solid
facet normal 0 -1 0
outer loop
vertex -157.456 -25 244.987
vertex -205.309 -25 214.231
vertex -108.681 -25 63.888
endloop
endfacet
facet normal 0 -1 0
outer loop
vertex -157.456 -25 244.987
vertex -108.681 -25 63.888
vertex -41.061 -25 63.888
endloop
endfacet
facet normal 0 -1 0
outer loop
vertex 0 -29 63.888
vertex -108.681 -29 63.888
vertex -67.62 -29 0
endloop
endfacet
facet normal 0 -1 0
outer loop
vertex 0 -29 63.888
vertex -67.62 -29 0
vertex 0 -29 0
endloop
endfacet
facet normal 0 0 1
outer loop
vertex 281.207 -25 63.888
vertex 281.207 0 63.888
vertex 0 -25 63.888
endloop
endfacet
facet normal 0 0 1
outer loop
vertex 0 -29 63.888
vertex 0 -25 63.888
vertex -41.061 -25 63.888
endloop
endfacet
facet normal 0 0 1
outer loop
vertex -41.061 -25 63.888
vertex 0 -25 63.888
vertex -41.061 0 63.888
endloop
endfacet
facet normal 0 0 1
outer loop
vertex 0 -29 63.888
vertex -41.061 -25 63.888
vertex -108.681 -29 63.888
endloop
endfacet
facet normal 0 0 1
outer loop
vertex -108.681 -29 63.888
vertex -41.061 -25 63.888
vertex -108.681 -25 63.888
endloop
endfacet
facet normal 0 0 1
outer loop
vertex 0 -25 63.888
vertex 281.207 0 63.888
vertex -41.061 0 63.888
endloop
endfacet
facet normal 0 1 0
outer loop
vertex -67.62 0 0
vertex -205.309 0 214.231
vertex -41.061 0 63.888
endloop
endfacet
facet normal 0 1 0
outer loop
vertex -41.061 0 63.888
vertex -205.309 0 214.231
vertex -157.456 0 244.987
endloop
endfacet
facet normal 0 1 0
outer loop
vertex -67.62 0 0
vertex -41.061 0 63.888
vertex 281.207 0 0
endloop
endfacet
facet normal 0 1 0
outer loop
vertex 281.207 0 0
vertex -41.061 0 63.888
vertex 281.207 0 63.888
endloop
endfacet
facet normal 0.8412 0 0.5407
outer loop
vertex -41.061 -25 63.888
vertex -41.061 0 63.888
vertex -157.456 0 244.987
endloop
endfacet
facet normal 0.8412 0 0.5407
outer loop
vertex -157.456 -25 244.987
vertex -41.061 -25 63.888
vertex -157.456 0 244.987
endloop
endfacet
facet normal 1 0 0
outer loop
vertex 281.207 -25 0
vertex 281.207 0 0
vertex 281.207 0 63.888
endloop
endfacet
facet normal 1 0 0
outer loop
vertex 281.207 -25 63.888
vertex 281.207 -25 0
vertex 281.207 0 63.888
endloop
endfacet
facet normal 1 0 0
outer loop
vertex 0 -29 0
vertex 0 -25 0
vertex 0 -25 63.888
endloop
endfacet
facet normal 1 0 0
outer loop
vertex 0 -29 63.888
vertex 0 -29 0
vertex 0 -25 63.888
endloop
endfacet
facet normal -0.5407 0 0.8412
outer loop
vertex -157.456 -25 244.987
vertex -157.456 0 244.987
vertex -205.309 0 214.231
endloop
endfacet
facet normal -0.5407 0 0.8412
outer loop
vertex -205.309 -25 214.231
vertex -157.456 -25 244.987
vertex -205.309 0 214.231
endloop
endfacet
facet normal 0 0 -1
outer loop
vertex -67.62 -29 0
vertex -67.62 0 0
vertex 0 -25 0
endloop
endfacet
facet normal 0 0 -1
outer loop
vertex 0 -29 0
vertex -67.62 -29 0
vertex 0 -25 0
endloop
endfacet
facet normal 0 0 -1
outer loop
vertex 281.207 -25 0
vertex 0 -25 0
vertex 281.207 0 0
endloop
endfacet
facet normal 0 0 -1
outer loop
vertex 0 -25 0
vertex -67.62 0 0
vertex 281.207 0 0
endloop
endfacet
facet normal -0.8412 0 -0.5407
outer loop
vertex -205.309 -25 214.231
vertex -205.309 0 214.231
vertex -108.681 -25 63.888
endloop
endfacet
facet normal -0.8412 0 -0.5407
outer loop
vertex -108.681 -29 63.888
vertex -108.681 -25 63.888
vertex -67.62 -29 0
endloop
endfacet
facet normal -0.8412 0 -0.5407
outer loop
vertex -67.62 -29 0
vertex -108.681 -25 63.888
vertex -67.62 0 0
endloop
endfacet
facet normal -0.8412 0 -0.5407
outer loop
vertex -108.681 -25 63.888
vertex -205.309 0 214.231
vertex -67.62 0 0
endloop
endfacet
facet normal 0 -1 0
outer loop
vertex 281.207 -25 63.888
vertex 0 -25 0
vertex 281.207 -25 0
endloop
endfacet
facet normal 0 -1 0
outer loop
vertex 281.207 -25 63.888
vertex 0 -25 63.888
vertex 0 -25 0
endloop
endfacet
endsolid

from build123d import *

# Parameters (mm, degrees)
F1_DEPTH = 25
F2_DEPTH = 25
F5_DEPTH = 4


with BuildPart() as f1:
    # F0 (on Front) → F1 (new body)
    with BuildSketch(Plane.XZ):
        Polygon((-67.6198684814, 0), (0, 0), (-41.0613296764, 63.8877525926), (-157.4556678534, 244.9869215488), (-205.308600446, 214.2313391182), align=None)
    extrude(amount=F1_DEPTH)

    # F0 (on Front) → F2 (join)
    with BuildSketch(Plane.XZ):
        Polygon((-41.0613296764, 63.8877525926), (0, 0), (281.2067568302, 0), (281.2067568302, 63.8877525926), align=None)
    extrude(amount=F2_DEPTH)

    # F4 (on offset) → F5 (join)
    with BuildSketch(Plane.XZ.offset(25)):
        Polygon((0, 0), (0, 63.8877525926), (-108.6811981577, 63.8877525926), (-67.6198684814, 0), align=None)
    extrude(amount=F5_DEPTH)


solid = f1.part
